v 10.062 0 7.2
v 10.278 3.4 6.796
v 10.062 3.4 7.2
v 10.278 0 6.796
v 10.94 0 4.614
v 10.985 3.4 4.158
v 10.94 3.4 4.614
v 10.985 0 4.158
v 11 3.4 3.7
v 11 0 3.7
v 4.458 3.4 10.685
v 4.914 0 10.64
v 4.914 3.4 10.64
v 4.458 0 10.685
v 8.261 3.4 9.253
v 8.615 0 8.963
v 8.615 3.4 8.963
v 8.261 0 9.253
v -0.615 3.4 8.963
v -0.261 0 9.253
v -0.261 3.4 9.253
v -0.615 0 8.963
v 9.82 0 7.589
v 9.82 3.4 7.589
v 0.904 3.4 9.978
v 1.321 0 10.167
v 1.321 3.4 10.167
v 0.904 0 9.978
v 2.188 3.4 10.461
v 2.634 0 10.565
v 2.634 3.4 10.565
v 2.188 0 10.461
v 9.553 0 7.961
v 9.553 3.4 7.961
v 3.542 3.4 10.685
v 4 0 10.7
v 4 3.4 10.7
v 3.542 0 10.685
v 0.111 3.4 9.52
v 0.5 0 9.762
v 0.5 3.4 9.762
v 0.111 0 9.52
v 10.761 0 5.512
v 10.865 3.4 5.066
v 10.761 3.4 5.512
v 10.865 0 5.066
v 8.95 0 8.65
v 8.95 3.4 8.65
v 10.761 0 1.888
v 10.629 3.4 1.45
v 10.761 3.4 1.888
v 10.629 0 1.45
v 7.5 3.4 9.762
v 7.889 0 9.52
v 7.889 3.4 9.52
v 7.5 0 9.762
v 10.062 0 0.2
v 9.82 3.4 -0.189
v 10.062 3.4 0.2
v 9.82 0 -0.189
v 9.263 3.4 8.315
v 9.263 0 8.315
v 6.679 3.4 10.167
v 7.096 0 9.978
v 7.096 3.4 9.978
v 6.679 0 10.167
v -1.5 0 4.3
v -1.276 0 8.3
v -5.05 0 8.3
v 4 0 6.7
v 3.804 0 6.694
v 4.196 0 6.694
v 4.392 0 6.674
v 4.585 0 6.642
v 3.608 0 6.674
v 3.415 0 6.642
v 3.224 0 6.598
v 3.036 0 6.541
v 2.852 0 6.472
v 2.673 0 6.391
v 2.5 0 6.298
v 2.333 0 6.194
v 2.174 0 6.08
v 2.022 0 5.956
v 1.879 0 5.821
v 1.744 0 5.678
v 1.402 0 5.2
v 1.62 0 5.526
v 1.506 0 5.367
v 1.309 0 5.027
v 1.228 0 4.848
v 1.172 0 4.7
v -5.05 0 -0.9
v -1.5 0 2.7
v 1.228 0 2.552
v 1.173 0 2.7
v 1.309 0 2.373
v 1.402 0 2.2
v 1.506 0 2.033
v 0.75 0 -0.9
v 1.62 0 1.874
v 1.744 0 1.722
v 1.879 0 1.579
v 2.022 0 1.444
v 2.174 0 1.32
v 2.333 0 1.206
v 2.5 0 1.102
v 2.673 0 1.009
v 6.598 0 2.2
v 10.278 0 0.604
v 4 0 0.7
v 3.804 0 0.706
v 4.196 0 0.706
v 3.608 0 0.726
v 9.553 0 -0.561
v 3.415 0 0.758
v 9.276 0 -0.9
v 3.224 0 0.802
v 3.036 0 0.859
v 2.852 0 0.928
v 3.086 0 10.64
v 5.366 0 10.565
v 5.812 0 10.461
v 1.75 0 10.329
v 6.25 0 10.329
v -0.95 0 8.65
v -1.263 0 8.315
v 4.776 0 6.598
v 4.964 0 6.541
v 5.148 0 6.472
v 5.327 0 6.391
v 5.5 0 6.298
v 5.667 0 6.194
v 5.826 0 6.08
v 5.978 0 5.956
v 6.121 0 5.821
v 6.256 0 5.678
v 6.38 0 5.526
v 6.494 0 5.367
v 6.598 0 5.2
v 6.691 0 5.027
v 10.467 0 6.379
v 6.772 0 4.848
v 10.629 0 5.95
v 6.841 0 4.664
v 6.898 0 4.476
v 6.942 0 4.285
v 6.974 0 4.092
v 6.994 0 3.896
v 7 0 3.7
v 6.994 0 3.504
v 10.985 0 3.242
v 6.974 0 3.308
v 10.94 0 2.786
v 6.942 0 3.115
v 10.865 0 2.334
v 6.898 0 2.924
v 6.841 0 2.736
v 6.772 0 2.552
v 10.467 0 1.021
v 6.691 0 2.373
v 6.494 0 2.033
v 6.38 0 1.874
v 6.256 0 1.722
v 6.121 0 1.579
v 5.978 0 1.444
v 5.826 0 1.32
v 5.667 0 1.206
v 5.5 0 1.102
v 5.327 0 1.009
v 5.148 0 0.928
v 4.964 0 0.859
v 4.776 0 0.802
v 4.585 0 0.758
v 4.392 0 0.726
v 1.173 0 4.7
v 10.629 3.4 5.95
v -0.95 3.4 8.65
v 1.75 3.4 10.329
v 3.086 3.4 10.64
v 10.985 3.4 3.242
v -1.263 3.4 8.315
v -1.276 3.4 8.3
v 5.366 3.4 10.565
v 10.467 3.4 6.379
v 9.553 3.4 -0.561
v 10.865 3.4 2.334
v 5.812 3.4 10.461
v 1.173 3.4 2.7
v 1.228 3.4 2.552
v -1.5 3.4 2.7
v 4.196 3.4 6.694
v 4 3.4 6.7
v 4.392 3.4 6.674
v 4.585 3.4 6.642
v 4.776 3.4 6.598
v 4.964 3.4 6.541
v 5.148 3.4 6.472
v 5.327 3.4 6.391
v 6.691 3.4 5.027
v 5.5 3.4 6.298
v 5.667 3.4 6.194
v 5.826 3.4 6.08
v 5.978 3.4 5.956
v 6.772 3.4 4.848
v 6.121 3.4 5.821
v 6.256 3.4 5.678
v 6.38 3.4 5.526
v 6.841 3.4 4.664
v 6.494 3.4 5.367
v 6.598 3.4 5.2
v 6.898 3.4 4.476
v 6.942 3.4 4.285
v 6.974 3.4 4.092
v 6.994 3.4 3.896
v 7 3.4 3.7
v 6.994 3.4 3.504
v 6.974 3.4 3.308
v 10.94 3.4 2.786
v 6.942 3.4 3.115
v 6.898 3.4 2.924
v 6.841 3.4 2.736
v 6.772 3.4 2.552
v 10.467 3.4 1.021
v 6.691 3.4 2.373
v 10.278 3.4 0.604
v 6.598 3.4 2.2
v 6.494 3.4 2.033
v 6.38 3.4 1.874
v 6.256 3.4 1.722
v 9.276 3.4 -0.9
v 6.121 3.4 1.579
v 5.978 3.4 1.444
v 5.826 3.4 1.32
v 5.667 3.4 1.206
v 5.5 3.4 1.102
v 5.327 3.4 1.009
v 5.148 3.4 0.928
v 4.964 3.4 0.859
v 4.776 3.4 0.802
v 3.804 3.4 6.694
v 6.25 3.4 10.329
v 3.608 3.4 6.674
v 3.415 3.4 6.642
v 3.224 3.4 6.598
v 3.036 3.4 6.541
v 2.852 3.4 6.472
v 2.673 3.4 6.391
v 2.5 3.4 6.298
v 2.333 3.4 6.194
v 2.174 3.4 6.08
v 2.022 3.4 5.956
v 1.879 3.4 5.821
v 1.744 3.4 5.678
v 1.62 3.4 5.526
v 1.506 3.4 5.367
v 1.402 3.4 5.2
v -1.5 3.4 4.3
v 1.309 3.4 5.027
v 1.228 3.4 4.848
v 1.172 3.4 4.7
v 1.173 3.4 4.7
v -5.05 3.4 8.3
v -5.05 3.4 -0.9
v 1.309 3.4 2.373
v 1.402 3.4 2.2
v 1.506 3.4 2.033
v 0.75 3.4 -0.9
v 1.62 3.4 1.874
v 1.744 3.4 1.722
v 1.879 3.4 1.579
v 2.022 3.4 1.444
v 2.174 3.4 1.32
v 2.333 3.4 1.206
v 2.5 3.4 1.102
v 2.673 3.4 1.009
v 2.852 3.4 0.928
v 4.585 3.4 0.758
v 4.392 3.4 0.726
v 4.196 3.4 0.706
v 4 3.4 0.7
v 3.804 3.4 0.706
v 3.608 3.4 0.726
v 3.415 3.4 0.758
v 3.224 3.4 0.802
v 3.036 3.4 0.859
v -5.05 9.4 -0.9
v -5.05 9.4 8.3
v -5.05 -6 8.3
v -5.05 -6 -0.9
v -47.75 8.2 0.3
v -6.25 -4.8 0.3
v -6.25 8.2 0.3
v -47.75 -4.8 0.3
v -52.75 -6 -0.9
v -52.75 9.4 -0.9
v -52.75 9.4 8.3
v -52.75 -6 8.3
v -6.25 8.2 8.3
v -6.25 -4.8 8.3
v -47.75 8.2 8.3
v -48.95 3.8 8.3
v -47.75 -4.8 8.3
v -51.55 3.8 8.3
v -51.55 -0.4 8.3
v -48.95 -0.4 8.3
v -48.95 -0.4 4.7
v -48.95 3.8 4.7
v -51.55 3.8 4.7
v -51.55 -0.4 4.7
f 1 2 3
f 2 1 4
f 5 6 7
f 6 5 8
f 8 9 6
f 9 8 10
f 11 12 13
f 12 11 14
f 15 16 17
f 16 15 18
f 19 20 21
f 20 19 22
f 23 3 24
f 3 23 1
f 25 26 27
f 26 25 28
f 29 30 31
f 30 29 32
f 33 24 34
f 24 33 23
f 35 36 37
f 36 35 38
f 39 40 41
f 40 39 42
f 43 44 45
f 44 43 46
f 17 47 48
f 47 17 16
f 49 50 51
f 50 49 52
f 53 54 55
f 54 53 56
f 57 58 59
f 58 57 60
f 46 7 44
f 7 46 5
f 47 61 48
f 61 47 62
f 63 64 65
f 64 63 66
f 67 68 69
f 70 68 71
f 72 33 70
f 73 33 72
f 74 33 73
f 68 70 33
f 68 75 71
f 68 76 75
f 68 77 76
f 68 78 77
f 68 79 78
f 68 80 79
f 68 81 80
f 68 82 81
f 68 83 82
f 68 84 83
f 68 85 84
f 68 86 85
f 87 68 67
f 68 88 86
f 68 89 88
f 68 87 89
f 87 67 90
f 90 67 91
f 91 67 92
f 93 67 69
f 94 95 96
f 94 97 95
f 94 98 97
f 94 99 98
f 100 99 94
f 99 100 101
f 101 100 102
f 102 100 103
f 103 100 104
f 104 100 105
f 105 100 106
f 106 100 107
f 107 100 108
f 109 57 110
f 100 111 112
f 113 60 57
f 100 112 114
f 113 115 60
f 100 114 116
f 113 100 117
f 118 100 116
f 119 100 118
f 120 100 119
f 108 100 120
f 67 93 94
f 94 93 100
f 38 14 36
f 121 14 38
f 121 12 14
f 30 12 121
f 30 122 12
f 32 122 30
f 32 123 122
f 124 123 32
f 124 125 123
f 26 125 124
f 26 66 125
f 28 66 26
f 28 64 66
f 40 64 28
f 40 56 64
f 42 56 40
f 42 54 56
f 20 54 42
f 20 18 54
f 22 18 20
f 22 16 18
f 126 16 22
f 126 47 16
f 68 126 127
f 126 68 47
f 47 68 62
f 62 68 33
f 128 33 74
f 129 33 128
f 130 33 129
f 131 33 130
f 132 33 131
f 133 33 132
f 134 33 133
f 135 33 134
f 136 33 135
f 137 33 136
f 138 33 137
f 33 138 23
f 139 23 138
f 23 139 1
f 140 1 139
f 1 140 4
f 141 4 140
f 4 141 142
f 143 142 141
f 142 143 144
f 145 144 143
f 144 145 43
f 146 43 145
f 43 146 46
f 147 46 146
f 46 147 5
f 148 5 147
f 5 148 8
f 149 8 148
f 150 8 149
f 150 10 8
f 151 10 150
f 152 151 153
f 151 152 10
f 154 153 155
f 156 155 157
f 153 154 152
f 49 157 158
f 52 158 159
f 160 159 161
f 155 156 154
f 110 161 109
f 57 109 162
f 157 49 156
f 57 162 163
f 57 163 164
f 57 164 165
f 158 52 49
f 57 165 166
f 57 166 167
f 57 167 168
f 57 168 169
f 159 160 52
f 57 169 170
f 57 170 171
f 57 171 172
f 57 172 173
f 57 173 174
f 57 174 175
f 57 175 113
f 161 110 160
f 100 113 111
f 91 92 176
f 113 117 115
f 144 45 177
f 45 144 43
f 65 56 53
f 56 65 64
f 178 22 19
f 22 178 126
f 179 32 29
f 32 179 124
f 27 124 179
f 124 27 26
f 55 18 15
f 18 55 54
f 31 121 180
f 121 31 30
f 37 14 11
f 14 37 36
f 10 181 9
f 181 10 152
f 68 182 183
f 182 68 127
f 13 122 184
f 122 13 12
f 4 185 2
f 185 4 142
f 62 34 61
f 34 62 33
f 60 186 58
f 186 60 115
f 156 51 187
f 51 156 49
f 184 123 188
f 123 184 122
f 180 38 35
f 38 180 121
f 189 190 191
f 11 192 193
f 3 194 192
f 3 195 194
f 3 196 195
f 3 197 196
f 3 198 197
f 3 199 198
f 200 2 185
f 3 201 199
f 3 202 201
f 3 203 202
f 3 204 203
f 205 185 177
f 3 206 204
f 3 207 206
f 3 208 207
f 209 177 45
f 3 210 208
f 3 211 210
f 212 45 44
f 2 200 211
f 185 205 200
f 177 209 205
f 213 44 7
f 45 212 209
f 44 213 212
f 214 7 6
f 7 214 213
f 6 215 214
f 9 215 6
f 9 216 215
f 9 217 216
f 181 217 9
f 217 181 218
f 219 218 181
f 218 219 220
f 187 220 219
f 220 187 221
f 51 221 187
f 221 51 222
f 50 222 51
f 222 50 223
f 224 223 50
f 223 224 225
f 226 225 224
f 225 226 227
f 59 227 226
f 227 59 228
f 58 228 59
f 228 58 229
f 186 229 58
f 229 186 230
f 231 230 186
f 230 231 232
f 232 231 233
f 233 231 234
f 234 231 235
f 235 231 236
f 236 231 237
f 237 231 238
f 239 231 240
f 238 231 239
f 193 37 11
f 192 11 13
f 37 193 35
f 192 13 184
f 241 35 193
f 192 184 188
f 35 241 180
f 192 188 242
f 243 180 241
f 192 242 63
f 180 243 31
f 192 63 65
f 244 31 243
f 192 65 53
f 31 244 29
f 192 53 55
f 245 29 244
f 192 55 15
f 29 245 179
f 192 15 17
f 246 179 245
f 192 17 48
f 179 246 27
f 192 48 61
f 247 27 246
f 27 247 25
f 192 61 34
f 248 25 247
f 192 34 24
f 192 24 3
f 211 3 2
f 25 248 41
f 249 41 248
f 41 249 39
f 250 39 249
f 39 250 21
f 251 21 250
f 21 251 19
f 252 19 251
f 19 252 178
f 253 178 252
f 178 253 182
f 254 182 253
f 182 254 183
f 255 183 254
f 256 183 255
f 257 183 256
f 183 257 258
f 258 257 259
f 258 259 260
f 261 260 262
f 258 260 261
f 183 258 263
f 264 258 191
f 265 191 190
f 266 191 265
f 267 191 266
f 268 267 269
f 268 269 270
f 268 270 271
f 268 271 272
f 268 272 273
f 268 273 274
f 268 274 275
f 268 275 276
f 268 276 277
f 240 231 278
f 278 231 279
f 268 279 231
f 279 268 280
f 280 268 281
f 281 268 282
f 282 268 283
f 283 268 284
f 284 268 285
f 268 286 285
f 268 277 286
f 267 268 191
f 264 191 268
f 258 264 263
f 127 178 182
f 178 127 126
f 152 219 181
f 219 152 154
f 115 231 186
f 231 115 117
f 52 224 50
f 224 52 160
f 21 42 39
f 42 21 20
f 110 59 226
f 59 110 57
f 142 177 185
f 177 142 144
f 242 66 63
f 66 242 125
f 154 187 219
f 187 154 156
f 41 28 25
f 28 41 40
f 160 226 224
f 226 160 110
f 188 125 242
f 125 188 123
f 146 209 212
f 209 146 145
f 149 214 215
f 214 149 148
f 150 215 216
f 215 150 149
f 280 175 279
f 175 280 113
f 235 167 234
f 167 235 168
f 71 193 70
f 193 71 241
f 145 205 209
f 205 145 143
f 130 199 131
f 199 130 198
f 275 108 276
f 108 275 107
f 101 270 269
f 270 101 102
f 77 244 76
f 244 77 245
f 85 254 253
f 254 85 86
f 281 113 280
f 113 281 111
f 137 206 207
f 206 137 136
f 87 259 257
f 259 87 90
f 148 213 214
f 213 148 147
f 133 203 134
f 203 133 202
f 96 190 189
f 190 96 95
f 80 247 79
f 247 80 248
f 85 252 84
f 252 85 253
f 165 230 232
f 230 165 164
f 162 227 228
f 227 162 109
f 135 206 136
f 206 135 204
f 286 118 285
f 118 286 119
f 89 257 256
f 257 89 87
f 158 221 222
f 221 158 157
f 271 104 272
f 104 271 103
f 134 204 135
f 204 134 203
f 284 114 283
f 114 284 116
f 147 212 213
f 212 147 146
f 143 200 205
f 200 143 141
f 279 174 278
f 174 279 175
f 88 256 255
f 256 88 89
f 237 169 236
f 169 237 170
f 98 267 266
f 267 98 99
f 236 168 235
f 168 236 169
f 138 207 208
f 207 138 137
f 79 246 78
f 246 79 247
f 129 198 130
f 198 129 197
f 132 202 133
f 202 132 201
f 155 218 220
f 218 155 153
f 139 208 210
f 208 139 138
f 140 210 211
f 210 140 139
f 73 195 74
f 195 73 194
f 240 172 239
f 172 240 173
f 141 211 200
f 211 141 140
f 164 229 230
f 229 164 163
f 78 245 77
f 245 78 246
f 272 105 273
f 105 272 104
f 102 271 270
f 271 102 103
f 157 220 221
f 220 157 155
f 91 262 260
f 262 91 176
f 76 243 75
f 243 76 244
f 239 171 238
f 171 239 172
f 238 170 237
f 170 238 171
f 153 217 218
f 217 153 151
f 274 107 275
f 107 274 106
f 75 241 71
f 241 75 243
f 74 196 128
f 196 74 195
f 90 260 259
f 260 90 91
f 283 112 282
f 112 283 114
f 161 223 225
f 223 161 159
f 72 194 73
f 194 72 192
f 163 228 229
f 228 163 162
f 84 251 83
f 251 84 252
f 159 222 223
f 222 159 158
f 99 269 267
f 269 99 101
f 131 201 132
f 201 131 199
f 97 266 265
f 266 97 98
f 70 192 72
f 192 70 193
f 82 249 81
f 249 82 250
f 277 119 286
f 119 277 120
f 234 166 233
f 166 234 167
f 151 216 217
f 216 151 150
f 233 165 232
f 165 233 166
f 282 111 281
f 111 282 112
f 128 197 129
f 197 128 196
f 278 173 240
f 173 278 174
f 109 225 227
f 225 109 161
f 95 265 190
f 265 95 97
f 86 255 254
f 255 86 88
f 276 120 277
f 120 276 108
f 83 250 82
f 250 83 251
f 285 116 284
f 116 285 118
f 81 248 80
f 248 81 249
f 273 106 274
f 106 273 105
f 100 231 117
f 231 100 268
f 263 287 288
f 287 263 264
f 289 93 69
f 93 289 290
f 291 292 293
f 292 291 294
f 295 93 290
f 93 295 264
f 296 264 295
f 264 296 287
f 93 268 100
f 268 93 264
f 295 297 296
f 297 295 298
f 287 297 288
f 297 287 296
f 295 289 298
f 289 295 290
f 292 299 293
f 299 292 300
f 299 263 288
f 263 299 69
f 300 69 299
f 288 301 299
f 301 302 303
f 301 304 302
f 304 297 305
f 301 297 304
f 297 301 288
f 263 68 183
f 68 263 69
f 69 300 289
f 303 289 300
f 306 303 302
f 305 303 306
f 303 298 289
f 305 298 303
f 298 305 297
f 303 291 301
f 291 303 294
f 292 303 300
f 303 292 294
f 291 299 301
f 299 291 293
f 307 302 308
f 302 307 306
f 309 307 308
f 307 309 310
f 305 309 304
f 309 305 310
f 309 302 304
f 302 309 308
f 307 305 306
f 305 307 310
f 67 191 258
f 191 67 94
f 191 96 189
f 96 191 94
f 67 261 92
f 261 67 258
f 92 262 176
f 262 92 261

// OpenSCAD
// DOUBLE TAKE FRAMES — CANONICAL LATCH
// DTF_RELEASE: 3.0.0
// Released: 2026-09-24
// Versioning: Semantic Versioning 2.0.0 (https://semver.org/)
// Status: CANONICAL
// Changes in 3.0.0:
// - Adds the missing second 1.2 mm long retaining wall so the pen/weight is
//   laterally captive with the latch in either cassette orientation.
//   The 13.0 mm clear pocket, Y=-8.0 mm installed centerline,
//   pivot eye, keyed socket, and flat-floor print orientation are unchanged.
// - Replaces C-clip retention with a loose, printable bayonet keyway that
//   installs over the wall-rig lug and becomes captive after rotation.
//
$fn = 96;

eps = 0.05;

// =========================================================
// FN WEIGHT LATCH
// =========================================================
post_d = 5.5;
// The keyed nub provides axial retention, so this pivot can remain freely
// rotating without the excessive wobble of the former 0.60 mm radial gap.
// A 0.40 mm radial gap remains generous for horizontal-hole shrinkage.
clear_radial = 0.25;
eye_inner_d = post_d + 2 * clear_radial;
eye_outer_d = 14.0;

// Clipless bayonet retention. A single inside/arm-side bore recess admits the
// fixed peg nub only at the installation angle. The outer eye ring stays
// continuous; rotation puts intact bore material behind the nub.
bayonet_lug_outer_r = 5.00;
// A symmetric one-nozzle-wide outer tip is simpler and more reliable than a
// barely visible one-sided taper. The structural root remains 1.80 mm wide.
bayonet_lug_tip_w = 0.60;
bayonet_key_radial_clear = 0.50;
// Preserve the approved 2.00 mm notch height where it meets the bore. At the
// outer mouth, its flat lower edge and diagonal upper roof leave 0.30 mm above
// the symmetric tip and 0.70 mm below it.
bayonet_notch_outer_r = bayonet_lug_outer_r + bayonet_key_radial_clear;
bayonet_notch_w = 2.00;
bayonet_notch_upper_mouth_clear = 0.30;
bayonet_notch_lower_z = -bayonet_notch_w / 2;
bayonet_notch_upper_bore_z = bayonet_notch_w / 2;
bayonet_notch_upper_mouth_z =
    bayonet_lug_tip_w / 2 + bayonet_notch_upper_mouth_clear;
bayonet_notch_bore_x =
    -sqrt(pow(eye_inner_d / 2, 2) - pow(bayonet_notch_upper_bore_z, 2));

latch_t = 3.4;
pivot_x = 4.0;

corral_clear_w_x = 41.5;
corral_clear_d_y = 13.0;
corral_wall_t = 1.2;
corral_depth_z = 8.0;
corral_floor_t = 1.2;
corral_end_wall_t_x = 5.0;
canonical_weight_center_x = -27.0;

// Match the installed latch plane used by the canonical wall rig.
standoff_h = 0.8;
post_h = 4.0;
corral_global_outer_y1 = -0.30;
corral_center_y_target = corral_global_outer_y1
                         - (corral_clear_d_y + 2 * corral_wall_t) / 2;
pad_t = -corral_center_y_target - standoff_h - post_h / 2;
post_y1 = -pad_t - standoff_h - post_h;
latch_install_y = post_y1 + (post_h - latch_t) / 2;

corral_inner_x0 = canonical_weight_center_x - corral_clear_w_x / 2;
corral_inner_x1 = canonical_weight_center_x + corral_clear_w_x / 2;
corral_floor_x0 = corral_inner_x0 - corral_end_wall_t_x;
corral_floor_x1 = corral_inner_x1 + corral_wall_t;

corral_outer_y1 = corral_global_outer_y1 - latch_install_y;
corral_inner_y1 = corral_outer_y1 - corral_wall_t;
corral_inner_y0 = corral_inner_y1 - corral_clear_d_y;
corral_outer_y0 = corral_inner_y0 - corral_wall_t;

installed_corral_yc = latch_install_y
                      + (corral_inner_y0 + corral_inner_y1) / 2;
installed_eye_yc = latch_install_y + latch_t / 2;

corral_floor_z0 = -0.90;
corral_floor_z = corral_floor_z0 + corral_floor_t;
corral_wall_z1 = corral_floor_z + corral_depth_z;
pivot_z = (corral_floor_z0 + corral_wall_z1) / 2;
pivot_eye_flat_local_z = corral_floor_z0 - pivot_z;

pivot_transition_x0 = corral_floor_x1;
pivot_transition_x1 = pivot_x - (eye_inner_d / 2 + 0.25);

// Far-end Y-retention socket. The matching roof-hung tooth belongs to the
// fixed wall rig; this socket is open at the top so the latch disengages
// cleanly as it swings downward.
latch_key_tooth_w_x = 1.4;
latch_key_tooth_w_y = 3.0;
latch_key_clear_xy = 0.60;
latch_key_clear_z = 0.60;
latch_key_engagement_z = 3.0;

latch_key_xc = (corral_floor_x0 + corral_inner_x0) / 2;
latch_key_local_yc = (corral_outer_y0 + corral_outer_y1) / 2;
latch_key_notch_x0 = latch_key_xc - latch_key_tooth_w_x / 2
                     - latch_key_clear_xy;
latch_key_notch_x1 = latch_key_xc + latch_key_tooth_w_x / 2
                     + latch_key_clear_xy;
latch_key_notch_y0 = latch_key_local_yc - latch_key_tooth_w_y / 2
                     - latch_key_clear_xy;
latch_key_notch_y1 = latch_key_local_yc + latch_key_tooth_w_y / 2
                     + latch_key_clear_xy;
latch_key_notch_z0 = corral_wall_z1 - latch_key_engagement_z
                     - latch_key_clear_z;

// =========================================================
// HELPERS
// =========================================================
module rect_prism(x0, x1, y0, y1, z0, z1) {
    translate([min(x0, x1), min(y0, y1), min(z0, z1)])
        cube([abs(x1 - x0), abs(y1 - y0), abs(z1 - z0)]);
}

module cyl_y_span(d, y0, y1) {
    translate([0, max(y0, y1), 0])
        rotate([90, 0, 0])
            cylinder(d=d, h=abs(y1 - y0), center=false);
}

// =========================================================
// PRINTABLE PARTS
// =========================================================
module canonical_latch_core() {
    translate([pivot_x, 0, pivot_z])
        difference() {
            cyl_y_span(eye_outer_d, 0, latch_t);
            cyl_y_span(eye_inner_d, -0.1, latch_t + 0.2);

            // Flatten only the unused lower eye arc so the complete latch
            // prints on the same plane as the corral floor.
            rect_prism(-eye_outer_d / 2 - 1,
                       eye_outer_d / 2 + 1,
                       -0.1, latch_t + 0.2,
                       -eye_outer_d / 2 - 1,
                       pivot_eye_flat_local_z);
        }
}

module fn_weight_corral() {
    difference() {
        union() {
            // Shallow floor beneath the weight pocket and keyed extension.
            rect_prism(corral_floor_x0, corral_floor_x1,
                       corral_outer_y0, corral_outer_y1,
                       corral_floor_z0, corral_floor_z);

            // Viewer-facing wall. The frame wall closes the opposite side.
            rect_prism(corral_inner_x0, corral_inner_x1,
                       corral_outer_y0, corral_inner_y0,
                       corral_floor_z, corral_wall_z1);

            // Matching opposite wall for either cassette orientation. It rises
            // directly from the existing floor, so the established flat-floor
            // print orientation gains no bridge or unsupported shelf. At
            // 1.2 mm it is two nominal lines with a 0.6 mm nozzle.
            rect_prism(corral_inner_x0, corral_inner_x1,
                       corral_inner_y1, corral_outer_y1,
                       corral_floor_z, corral_wall_z1);

            // Pivot-side wall.
            rect_prism(corral_inner_x1, corral_floor_x1,
                       corral_outer_y0, corral_outer_y1,
                       corral_floor_z, corral_wall_z1);

            // Substantial far-end wall carrying the retention socket.
            rect_prism(corral_floor_x0, corral_inner_x0,
                       corral_outer_y0, corral_outer_y1,
                       corral_floor_z, corral_wall_z1);

            // Compact load path from the corral into the pivot eye.
            rect_prism(pivot_transition_x0, pivot_transition_x1,
                       0, latch_t,
                       corral_floor_z0, corral_wall_z1);
        }

        rect_prism(latch_key_notch_x0, latch_key_notch_x1,
                   latch_key_notch_y0, latch_key_notch_y1,
                   latch_key_notch_z0, corral_wall_z1 + eps);
    }
}

module swinging_latch() {
    difference() {
        union() {
            canonical_latch_core();
            fn_weight_corral();
        }

        // One asymmetric keyway cut after the eye and transition are united:
        // flat lower edge, printable diagonal upper roof, and full clearance
        // at the bore. No later union can fill the subtraction back in.
        translate([pivot_x,0,pivot_z])
            translate([0, latch_t + 0.1, 0])
                rotate([90,0,0])
                    linear_extrude(height = latch_t + 0.2)
                        polygon(points = [
                            [-bayonet_notch_outer_r, bayonet_notch_lower_z],
                            [0, bayonet_notch_lower_z],
                            [0, bayonet_notch_upper_bore_z],
                            [bayonet_notch_bore_x,
                             bayonet_notch_upper_bore_z],
                            [-bayonet_notch_outer_r,
                             bayonet_notch_upper_mouth_z]
                        ]);
    }
}

assert(corral_clear_w_x == 41.5);
assert(corral_clear_d_y == 13.0);
assert(pivot_transition_x1 > pivot_transition_x0);
assert(abs(installed_corral_yc + 8.0) < eps,
       "pen/weight pocket no longer uses the measured Y=-8 mm centerline");
assert(abs(installed_eye_yc - installed_corral_yc) < eps,
       "pen/weight pocket is no longer centered on the pivot eye");
assert(abs((corral_inner_y1-corral_inner_y0) - corral_clear_d_y) < eps,
       "opposite wall changed the 13 mm clear pocket depth");
assert(eye_outer_d / 2 - bayonet_notch_outer_r >= 1.49,
       "inside notch must preserve the continuous outer eye ring");
assert(bayonet_lug_outer_r - eye_inner_d / 2 >= 0.8,
       "bayonet lug has too little radial retention engagement");

swinging_latch();
